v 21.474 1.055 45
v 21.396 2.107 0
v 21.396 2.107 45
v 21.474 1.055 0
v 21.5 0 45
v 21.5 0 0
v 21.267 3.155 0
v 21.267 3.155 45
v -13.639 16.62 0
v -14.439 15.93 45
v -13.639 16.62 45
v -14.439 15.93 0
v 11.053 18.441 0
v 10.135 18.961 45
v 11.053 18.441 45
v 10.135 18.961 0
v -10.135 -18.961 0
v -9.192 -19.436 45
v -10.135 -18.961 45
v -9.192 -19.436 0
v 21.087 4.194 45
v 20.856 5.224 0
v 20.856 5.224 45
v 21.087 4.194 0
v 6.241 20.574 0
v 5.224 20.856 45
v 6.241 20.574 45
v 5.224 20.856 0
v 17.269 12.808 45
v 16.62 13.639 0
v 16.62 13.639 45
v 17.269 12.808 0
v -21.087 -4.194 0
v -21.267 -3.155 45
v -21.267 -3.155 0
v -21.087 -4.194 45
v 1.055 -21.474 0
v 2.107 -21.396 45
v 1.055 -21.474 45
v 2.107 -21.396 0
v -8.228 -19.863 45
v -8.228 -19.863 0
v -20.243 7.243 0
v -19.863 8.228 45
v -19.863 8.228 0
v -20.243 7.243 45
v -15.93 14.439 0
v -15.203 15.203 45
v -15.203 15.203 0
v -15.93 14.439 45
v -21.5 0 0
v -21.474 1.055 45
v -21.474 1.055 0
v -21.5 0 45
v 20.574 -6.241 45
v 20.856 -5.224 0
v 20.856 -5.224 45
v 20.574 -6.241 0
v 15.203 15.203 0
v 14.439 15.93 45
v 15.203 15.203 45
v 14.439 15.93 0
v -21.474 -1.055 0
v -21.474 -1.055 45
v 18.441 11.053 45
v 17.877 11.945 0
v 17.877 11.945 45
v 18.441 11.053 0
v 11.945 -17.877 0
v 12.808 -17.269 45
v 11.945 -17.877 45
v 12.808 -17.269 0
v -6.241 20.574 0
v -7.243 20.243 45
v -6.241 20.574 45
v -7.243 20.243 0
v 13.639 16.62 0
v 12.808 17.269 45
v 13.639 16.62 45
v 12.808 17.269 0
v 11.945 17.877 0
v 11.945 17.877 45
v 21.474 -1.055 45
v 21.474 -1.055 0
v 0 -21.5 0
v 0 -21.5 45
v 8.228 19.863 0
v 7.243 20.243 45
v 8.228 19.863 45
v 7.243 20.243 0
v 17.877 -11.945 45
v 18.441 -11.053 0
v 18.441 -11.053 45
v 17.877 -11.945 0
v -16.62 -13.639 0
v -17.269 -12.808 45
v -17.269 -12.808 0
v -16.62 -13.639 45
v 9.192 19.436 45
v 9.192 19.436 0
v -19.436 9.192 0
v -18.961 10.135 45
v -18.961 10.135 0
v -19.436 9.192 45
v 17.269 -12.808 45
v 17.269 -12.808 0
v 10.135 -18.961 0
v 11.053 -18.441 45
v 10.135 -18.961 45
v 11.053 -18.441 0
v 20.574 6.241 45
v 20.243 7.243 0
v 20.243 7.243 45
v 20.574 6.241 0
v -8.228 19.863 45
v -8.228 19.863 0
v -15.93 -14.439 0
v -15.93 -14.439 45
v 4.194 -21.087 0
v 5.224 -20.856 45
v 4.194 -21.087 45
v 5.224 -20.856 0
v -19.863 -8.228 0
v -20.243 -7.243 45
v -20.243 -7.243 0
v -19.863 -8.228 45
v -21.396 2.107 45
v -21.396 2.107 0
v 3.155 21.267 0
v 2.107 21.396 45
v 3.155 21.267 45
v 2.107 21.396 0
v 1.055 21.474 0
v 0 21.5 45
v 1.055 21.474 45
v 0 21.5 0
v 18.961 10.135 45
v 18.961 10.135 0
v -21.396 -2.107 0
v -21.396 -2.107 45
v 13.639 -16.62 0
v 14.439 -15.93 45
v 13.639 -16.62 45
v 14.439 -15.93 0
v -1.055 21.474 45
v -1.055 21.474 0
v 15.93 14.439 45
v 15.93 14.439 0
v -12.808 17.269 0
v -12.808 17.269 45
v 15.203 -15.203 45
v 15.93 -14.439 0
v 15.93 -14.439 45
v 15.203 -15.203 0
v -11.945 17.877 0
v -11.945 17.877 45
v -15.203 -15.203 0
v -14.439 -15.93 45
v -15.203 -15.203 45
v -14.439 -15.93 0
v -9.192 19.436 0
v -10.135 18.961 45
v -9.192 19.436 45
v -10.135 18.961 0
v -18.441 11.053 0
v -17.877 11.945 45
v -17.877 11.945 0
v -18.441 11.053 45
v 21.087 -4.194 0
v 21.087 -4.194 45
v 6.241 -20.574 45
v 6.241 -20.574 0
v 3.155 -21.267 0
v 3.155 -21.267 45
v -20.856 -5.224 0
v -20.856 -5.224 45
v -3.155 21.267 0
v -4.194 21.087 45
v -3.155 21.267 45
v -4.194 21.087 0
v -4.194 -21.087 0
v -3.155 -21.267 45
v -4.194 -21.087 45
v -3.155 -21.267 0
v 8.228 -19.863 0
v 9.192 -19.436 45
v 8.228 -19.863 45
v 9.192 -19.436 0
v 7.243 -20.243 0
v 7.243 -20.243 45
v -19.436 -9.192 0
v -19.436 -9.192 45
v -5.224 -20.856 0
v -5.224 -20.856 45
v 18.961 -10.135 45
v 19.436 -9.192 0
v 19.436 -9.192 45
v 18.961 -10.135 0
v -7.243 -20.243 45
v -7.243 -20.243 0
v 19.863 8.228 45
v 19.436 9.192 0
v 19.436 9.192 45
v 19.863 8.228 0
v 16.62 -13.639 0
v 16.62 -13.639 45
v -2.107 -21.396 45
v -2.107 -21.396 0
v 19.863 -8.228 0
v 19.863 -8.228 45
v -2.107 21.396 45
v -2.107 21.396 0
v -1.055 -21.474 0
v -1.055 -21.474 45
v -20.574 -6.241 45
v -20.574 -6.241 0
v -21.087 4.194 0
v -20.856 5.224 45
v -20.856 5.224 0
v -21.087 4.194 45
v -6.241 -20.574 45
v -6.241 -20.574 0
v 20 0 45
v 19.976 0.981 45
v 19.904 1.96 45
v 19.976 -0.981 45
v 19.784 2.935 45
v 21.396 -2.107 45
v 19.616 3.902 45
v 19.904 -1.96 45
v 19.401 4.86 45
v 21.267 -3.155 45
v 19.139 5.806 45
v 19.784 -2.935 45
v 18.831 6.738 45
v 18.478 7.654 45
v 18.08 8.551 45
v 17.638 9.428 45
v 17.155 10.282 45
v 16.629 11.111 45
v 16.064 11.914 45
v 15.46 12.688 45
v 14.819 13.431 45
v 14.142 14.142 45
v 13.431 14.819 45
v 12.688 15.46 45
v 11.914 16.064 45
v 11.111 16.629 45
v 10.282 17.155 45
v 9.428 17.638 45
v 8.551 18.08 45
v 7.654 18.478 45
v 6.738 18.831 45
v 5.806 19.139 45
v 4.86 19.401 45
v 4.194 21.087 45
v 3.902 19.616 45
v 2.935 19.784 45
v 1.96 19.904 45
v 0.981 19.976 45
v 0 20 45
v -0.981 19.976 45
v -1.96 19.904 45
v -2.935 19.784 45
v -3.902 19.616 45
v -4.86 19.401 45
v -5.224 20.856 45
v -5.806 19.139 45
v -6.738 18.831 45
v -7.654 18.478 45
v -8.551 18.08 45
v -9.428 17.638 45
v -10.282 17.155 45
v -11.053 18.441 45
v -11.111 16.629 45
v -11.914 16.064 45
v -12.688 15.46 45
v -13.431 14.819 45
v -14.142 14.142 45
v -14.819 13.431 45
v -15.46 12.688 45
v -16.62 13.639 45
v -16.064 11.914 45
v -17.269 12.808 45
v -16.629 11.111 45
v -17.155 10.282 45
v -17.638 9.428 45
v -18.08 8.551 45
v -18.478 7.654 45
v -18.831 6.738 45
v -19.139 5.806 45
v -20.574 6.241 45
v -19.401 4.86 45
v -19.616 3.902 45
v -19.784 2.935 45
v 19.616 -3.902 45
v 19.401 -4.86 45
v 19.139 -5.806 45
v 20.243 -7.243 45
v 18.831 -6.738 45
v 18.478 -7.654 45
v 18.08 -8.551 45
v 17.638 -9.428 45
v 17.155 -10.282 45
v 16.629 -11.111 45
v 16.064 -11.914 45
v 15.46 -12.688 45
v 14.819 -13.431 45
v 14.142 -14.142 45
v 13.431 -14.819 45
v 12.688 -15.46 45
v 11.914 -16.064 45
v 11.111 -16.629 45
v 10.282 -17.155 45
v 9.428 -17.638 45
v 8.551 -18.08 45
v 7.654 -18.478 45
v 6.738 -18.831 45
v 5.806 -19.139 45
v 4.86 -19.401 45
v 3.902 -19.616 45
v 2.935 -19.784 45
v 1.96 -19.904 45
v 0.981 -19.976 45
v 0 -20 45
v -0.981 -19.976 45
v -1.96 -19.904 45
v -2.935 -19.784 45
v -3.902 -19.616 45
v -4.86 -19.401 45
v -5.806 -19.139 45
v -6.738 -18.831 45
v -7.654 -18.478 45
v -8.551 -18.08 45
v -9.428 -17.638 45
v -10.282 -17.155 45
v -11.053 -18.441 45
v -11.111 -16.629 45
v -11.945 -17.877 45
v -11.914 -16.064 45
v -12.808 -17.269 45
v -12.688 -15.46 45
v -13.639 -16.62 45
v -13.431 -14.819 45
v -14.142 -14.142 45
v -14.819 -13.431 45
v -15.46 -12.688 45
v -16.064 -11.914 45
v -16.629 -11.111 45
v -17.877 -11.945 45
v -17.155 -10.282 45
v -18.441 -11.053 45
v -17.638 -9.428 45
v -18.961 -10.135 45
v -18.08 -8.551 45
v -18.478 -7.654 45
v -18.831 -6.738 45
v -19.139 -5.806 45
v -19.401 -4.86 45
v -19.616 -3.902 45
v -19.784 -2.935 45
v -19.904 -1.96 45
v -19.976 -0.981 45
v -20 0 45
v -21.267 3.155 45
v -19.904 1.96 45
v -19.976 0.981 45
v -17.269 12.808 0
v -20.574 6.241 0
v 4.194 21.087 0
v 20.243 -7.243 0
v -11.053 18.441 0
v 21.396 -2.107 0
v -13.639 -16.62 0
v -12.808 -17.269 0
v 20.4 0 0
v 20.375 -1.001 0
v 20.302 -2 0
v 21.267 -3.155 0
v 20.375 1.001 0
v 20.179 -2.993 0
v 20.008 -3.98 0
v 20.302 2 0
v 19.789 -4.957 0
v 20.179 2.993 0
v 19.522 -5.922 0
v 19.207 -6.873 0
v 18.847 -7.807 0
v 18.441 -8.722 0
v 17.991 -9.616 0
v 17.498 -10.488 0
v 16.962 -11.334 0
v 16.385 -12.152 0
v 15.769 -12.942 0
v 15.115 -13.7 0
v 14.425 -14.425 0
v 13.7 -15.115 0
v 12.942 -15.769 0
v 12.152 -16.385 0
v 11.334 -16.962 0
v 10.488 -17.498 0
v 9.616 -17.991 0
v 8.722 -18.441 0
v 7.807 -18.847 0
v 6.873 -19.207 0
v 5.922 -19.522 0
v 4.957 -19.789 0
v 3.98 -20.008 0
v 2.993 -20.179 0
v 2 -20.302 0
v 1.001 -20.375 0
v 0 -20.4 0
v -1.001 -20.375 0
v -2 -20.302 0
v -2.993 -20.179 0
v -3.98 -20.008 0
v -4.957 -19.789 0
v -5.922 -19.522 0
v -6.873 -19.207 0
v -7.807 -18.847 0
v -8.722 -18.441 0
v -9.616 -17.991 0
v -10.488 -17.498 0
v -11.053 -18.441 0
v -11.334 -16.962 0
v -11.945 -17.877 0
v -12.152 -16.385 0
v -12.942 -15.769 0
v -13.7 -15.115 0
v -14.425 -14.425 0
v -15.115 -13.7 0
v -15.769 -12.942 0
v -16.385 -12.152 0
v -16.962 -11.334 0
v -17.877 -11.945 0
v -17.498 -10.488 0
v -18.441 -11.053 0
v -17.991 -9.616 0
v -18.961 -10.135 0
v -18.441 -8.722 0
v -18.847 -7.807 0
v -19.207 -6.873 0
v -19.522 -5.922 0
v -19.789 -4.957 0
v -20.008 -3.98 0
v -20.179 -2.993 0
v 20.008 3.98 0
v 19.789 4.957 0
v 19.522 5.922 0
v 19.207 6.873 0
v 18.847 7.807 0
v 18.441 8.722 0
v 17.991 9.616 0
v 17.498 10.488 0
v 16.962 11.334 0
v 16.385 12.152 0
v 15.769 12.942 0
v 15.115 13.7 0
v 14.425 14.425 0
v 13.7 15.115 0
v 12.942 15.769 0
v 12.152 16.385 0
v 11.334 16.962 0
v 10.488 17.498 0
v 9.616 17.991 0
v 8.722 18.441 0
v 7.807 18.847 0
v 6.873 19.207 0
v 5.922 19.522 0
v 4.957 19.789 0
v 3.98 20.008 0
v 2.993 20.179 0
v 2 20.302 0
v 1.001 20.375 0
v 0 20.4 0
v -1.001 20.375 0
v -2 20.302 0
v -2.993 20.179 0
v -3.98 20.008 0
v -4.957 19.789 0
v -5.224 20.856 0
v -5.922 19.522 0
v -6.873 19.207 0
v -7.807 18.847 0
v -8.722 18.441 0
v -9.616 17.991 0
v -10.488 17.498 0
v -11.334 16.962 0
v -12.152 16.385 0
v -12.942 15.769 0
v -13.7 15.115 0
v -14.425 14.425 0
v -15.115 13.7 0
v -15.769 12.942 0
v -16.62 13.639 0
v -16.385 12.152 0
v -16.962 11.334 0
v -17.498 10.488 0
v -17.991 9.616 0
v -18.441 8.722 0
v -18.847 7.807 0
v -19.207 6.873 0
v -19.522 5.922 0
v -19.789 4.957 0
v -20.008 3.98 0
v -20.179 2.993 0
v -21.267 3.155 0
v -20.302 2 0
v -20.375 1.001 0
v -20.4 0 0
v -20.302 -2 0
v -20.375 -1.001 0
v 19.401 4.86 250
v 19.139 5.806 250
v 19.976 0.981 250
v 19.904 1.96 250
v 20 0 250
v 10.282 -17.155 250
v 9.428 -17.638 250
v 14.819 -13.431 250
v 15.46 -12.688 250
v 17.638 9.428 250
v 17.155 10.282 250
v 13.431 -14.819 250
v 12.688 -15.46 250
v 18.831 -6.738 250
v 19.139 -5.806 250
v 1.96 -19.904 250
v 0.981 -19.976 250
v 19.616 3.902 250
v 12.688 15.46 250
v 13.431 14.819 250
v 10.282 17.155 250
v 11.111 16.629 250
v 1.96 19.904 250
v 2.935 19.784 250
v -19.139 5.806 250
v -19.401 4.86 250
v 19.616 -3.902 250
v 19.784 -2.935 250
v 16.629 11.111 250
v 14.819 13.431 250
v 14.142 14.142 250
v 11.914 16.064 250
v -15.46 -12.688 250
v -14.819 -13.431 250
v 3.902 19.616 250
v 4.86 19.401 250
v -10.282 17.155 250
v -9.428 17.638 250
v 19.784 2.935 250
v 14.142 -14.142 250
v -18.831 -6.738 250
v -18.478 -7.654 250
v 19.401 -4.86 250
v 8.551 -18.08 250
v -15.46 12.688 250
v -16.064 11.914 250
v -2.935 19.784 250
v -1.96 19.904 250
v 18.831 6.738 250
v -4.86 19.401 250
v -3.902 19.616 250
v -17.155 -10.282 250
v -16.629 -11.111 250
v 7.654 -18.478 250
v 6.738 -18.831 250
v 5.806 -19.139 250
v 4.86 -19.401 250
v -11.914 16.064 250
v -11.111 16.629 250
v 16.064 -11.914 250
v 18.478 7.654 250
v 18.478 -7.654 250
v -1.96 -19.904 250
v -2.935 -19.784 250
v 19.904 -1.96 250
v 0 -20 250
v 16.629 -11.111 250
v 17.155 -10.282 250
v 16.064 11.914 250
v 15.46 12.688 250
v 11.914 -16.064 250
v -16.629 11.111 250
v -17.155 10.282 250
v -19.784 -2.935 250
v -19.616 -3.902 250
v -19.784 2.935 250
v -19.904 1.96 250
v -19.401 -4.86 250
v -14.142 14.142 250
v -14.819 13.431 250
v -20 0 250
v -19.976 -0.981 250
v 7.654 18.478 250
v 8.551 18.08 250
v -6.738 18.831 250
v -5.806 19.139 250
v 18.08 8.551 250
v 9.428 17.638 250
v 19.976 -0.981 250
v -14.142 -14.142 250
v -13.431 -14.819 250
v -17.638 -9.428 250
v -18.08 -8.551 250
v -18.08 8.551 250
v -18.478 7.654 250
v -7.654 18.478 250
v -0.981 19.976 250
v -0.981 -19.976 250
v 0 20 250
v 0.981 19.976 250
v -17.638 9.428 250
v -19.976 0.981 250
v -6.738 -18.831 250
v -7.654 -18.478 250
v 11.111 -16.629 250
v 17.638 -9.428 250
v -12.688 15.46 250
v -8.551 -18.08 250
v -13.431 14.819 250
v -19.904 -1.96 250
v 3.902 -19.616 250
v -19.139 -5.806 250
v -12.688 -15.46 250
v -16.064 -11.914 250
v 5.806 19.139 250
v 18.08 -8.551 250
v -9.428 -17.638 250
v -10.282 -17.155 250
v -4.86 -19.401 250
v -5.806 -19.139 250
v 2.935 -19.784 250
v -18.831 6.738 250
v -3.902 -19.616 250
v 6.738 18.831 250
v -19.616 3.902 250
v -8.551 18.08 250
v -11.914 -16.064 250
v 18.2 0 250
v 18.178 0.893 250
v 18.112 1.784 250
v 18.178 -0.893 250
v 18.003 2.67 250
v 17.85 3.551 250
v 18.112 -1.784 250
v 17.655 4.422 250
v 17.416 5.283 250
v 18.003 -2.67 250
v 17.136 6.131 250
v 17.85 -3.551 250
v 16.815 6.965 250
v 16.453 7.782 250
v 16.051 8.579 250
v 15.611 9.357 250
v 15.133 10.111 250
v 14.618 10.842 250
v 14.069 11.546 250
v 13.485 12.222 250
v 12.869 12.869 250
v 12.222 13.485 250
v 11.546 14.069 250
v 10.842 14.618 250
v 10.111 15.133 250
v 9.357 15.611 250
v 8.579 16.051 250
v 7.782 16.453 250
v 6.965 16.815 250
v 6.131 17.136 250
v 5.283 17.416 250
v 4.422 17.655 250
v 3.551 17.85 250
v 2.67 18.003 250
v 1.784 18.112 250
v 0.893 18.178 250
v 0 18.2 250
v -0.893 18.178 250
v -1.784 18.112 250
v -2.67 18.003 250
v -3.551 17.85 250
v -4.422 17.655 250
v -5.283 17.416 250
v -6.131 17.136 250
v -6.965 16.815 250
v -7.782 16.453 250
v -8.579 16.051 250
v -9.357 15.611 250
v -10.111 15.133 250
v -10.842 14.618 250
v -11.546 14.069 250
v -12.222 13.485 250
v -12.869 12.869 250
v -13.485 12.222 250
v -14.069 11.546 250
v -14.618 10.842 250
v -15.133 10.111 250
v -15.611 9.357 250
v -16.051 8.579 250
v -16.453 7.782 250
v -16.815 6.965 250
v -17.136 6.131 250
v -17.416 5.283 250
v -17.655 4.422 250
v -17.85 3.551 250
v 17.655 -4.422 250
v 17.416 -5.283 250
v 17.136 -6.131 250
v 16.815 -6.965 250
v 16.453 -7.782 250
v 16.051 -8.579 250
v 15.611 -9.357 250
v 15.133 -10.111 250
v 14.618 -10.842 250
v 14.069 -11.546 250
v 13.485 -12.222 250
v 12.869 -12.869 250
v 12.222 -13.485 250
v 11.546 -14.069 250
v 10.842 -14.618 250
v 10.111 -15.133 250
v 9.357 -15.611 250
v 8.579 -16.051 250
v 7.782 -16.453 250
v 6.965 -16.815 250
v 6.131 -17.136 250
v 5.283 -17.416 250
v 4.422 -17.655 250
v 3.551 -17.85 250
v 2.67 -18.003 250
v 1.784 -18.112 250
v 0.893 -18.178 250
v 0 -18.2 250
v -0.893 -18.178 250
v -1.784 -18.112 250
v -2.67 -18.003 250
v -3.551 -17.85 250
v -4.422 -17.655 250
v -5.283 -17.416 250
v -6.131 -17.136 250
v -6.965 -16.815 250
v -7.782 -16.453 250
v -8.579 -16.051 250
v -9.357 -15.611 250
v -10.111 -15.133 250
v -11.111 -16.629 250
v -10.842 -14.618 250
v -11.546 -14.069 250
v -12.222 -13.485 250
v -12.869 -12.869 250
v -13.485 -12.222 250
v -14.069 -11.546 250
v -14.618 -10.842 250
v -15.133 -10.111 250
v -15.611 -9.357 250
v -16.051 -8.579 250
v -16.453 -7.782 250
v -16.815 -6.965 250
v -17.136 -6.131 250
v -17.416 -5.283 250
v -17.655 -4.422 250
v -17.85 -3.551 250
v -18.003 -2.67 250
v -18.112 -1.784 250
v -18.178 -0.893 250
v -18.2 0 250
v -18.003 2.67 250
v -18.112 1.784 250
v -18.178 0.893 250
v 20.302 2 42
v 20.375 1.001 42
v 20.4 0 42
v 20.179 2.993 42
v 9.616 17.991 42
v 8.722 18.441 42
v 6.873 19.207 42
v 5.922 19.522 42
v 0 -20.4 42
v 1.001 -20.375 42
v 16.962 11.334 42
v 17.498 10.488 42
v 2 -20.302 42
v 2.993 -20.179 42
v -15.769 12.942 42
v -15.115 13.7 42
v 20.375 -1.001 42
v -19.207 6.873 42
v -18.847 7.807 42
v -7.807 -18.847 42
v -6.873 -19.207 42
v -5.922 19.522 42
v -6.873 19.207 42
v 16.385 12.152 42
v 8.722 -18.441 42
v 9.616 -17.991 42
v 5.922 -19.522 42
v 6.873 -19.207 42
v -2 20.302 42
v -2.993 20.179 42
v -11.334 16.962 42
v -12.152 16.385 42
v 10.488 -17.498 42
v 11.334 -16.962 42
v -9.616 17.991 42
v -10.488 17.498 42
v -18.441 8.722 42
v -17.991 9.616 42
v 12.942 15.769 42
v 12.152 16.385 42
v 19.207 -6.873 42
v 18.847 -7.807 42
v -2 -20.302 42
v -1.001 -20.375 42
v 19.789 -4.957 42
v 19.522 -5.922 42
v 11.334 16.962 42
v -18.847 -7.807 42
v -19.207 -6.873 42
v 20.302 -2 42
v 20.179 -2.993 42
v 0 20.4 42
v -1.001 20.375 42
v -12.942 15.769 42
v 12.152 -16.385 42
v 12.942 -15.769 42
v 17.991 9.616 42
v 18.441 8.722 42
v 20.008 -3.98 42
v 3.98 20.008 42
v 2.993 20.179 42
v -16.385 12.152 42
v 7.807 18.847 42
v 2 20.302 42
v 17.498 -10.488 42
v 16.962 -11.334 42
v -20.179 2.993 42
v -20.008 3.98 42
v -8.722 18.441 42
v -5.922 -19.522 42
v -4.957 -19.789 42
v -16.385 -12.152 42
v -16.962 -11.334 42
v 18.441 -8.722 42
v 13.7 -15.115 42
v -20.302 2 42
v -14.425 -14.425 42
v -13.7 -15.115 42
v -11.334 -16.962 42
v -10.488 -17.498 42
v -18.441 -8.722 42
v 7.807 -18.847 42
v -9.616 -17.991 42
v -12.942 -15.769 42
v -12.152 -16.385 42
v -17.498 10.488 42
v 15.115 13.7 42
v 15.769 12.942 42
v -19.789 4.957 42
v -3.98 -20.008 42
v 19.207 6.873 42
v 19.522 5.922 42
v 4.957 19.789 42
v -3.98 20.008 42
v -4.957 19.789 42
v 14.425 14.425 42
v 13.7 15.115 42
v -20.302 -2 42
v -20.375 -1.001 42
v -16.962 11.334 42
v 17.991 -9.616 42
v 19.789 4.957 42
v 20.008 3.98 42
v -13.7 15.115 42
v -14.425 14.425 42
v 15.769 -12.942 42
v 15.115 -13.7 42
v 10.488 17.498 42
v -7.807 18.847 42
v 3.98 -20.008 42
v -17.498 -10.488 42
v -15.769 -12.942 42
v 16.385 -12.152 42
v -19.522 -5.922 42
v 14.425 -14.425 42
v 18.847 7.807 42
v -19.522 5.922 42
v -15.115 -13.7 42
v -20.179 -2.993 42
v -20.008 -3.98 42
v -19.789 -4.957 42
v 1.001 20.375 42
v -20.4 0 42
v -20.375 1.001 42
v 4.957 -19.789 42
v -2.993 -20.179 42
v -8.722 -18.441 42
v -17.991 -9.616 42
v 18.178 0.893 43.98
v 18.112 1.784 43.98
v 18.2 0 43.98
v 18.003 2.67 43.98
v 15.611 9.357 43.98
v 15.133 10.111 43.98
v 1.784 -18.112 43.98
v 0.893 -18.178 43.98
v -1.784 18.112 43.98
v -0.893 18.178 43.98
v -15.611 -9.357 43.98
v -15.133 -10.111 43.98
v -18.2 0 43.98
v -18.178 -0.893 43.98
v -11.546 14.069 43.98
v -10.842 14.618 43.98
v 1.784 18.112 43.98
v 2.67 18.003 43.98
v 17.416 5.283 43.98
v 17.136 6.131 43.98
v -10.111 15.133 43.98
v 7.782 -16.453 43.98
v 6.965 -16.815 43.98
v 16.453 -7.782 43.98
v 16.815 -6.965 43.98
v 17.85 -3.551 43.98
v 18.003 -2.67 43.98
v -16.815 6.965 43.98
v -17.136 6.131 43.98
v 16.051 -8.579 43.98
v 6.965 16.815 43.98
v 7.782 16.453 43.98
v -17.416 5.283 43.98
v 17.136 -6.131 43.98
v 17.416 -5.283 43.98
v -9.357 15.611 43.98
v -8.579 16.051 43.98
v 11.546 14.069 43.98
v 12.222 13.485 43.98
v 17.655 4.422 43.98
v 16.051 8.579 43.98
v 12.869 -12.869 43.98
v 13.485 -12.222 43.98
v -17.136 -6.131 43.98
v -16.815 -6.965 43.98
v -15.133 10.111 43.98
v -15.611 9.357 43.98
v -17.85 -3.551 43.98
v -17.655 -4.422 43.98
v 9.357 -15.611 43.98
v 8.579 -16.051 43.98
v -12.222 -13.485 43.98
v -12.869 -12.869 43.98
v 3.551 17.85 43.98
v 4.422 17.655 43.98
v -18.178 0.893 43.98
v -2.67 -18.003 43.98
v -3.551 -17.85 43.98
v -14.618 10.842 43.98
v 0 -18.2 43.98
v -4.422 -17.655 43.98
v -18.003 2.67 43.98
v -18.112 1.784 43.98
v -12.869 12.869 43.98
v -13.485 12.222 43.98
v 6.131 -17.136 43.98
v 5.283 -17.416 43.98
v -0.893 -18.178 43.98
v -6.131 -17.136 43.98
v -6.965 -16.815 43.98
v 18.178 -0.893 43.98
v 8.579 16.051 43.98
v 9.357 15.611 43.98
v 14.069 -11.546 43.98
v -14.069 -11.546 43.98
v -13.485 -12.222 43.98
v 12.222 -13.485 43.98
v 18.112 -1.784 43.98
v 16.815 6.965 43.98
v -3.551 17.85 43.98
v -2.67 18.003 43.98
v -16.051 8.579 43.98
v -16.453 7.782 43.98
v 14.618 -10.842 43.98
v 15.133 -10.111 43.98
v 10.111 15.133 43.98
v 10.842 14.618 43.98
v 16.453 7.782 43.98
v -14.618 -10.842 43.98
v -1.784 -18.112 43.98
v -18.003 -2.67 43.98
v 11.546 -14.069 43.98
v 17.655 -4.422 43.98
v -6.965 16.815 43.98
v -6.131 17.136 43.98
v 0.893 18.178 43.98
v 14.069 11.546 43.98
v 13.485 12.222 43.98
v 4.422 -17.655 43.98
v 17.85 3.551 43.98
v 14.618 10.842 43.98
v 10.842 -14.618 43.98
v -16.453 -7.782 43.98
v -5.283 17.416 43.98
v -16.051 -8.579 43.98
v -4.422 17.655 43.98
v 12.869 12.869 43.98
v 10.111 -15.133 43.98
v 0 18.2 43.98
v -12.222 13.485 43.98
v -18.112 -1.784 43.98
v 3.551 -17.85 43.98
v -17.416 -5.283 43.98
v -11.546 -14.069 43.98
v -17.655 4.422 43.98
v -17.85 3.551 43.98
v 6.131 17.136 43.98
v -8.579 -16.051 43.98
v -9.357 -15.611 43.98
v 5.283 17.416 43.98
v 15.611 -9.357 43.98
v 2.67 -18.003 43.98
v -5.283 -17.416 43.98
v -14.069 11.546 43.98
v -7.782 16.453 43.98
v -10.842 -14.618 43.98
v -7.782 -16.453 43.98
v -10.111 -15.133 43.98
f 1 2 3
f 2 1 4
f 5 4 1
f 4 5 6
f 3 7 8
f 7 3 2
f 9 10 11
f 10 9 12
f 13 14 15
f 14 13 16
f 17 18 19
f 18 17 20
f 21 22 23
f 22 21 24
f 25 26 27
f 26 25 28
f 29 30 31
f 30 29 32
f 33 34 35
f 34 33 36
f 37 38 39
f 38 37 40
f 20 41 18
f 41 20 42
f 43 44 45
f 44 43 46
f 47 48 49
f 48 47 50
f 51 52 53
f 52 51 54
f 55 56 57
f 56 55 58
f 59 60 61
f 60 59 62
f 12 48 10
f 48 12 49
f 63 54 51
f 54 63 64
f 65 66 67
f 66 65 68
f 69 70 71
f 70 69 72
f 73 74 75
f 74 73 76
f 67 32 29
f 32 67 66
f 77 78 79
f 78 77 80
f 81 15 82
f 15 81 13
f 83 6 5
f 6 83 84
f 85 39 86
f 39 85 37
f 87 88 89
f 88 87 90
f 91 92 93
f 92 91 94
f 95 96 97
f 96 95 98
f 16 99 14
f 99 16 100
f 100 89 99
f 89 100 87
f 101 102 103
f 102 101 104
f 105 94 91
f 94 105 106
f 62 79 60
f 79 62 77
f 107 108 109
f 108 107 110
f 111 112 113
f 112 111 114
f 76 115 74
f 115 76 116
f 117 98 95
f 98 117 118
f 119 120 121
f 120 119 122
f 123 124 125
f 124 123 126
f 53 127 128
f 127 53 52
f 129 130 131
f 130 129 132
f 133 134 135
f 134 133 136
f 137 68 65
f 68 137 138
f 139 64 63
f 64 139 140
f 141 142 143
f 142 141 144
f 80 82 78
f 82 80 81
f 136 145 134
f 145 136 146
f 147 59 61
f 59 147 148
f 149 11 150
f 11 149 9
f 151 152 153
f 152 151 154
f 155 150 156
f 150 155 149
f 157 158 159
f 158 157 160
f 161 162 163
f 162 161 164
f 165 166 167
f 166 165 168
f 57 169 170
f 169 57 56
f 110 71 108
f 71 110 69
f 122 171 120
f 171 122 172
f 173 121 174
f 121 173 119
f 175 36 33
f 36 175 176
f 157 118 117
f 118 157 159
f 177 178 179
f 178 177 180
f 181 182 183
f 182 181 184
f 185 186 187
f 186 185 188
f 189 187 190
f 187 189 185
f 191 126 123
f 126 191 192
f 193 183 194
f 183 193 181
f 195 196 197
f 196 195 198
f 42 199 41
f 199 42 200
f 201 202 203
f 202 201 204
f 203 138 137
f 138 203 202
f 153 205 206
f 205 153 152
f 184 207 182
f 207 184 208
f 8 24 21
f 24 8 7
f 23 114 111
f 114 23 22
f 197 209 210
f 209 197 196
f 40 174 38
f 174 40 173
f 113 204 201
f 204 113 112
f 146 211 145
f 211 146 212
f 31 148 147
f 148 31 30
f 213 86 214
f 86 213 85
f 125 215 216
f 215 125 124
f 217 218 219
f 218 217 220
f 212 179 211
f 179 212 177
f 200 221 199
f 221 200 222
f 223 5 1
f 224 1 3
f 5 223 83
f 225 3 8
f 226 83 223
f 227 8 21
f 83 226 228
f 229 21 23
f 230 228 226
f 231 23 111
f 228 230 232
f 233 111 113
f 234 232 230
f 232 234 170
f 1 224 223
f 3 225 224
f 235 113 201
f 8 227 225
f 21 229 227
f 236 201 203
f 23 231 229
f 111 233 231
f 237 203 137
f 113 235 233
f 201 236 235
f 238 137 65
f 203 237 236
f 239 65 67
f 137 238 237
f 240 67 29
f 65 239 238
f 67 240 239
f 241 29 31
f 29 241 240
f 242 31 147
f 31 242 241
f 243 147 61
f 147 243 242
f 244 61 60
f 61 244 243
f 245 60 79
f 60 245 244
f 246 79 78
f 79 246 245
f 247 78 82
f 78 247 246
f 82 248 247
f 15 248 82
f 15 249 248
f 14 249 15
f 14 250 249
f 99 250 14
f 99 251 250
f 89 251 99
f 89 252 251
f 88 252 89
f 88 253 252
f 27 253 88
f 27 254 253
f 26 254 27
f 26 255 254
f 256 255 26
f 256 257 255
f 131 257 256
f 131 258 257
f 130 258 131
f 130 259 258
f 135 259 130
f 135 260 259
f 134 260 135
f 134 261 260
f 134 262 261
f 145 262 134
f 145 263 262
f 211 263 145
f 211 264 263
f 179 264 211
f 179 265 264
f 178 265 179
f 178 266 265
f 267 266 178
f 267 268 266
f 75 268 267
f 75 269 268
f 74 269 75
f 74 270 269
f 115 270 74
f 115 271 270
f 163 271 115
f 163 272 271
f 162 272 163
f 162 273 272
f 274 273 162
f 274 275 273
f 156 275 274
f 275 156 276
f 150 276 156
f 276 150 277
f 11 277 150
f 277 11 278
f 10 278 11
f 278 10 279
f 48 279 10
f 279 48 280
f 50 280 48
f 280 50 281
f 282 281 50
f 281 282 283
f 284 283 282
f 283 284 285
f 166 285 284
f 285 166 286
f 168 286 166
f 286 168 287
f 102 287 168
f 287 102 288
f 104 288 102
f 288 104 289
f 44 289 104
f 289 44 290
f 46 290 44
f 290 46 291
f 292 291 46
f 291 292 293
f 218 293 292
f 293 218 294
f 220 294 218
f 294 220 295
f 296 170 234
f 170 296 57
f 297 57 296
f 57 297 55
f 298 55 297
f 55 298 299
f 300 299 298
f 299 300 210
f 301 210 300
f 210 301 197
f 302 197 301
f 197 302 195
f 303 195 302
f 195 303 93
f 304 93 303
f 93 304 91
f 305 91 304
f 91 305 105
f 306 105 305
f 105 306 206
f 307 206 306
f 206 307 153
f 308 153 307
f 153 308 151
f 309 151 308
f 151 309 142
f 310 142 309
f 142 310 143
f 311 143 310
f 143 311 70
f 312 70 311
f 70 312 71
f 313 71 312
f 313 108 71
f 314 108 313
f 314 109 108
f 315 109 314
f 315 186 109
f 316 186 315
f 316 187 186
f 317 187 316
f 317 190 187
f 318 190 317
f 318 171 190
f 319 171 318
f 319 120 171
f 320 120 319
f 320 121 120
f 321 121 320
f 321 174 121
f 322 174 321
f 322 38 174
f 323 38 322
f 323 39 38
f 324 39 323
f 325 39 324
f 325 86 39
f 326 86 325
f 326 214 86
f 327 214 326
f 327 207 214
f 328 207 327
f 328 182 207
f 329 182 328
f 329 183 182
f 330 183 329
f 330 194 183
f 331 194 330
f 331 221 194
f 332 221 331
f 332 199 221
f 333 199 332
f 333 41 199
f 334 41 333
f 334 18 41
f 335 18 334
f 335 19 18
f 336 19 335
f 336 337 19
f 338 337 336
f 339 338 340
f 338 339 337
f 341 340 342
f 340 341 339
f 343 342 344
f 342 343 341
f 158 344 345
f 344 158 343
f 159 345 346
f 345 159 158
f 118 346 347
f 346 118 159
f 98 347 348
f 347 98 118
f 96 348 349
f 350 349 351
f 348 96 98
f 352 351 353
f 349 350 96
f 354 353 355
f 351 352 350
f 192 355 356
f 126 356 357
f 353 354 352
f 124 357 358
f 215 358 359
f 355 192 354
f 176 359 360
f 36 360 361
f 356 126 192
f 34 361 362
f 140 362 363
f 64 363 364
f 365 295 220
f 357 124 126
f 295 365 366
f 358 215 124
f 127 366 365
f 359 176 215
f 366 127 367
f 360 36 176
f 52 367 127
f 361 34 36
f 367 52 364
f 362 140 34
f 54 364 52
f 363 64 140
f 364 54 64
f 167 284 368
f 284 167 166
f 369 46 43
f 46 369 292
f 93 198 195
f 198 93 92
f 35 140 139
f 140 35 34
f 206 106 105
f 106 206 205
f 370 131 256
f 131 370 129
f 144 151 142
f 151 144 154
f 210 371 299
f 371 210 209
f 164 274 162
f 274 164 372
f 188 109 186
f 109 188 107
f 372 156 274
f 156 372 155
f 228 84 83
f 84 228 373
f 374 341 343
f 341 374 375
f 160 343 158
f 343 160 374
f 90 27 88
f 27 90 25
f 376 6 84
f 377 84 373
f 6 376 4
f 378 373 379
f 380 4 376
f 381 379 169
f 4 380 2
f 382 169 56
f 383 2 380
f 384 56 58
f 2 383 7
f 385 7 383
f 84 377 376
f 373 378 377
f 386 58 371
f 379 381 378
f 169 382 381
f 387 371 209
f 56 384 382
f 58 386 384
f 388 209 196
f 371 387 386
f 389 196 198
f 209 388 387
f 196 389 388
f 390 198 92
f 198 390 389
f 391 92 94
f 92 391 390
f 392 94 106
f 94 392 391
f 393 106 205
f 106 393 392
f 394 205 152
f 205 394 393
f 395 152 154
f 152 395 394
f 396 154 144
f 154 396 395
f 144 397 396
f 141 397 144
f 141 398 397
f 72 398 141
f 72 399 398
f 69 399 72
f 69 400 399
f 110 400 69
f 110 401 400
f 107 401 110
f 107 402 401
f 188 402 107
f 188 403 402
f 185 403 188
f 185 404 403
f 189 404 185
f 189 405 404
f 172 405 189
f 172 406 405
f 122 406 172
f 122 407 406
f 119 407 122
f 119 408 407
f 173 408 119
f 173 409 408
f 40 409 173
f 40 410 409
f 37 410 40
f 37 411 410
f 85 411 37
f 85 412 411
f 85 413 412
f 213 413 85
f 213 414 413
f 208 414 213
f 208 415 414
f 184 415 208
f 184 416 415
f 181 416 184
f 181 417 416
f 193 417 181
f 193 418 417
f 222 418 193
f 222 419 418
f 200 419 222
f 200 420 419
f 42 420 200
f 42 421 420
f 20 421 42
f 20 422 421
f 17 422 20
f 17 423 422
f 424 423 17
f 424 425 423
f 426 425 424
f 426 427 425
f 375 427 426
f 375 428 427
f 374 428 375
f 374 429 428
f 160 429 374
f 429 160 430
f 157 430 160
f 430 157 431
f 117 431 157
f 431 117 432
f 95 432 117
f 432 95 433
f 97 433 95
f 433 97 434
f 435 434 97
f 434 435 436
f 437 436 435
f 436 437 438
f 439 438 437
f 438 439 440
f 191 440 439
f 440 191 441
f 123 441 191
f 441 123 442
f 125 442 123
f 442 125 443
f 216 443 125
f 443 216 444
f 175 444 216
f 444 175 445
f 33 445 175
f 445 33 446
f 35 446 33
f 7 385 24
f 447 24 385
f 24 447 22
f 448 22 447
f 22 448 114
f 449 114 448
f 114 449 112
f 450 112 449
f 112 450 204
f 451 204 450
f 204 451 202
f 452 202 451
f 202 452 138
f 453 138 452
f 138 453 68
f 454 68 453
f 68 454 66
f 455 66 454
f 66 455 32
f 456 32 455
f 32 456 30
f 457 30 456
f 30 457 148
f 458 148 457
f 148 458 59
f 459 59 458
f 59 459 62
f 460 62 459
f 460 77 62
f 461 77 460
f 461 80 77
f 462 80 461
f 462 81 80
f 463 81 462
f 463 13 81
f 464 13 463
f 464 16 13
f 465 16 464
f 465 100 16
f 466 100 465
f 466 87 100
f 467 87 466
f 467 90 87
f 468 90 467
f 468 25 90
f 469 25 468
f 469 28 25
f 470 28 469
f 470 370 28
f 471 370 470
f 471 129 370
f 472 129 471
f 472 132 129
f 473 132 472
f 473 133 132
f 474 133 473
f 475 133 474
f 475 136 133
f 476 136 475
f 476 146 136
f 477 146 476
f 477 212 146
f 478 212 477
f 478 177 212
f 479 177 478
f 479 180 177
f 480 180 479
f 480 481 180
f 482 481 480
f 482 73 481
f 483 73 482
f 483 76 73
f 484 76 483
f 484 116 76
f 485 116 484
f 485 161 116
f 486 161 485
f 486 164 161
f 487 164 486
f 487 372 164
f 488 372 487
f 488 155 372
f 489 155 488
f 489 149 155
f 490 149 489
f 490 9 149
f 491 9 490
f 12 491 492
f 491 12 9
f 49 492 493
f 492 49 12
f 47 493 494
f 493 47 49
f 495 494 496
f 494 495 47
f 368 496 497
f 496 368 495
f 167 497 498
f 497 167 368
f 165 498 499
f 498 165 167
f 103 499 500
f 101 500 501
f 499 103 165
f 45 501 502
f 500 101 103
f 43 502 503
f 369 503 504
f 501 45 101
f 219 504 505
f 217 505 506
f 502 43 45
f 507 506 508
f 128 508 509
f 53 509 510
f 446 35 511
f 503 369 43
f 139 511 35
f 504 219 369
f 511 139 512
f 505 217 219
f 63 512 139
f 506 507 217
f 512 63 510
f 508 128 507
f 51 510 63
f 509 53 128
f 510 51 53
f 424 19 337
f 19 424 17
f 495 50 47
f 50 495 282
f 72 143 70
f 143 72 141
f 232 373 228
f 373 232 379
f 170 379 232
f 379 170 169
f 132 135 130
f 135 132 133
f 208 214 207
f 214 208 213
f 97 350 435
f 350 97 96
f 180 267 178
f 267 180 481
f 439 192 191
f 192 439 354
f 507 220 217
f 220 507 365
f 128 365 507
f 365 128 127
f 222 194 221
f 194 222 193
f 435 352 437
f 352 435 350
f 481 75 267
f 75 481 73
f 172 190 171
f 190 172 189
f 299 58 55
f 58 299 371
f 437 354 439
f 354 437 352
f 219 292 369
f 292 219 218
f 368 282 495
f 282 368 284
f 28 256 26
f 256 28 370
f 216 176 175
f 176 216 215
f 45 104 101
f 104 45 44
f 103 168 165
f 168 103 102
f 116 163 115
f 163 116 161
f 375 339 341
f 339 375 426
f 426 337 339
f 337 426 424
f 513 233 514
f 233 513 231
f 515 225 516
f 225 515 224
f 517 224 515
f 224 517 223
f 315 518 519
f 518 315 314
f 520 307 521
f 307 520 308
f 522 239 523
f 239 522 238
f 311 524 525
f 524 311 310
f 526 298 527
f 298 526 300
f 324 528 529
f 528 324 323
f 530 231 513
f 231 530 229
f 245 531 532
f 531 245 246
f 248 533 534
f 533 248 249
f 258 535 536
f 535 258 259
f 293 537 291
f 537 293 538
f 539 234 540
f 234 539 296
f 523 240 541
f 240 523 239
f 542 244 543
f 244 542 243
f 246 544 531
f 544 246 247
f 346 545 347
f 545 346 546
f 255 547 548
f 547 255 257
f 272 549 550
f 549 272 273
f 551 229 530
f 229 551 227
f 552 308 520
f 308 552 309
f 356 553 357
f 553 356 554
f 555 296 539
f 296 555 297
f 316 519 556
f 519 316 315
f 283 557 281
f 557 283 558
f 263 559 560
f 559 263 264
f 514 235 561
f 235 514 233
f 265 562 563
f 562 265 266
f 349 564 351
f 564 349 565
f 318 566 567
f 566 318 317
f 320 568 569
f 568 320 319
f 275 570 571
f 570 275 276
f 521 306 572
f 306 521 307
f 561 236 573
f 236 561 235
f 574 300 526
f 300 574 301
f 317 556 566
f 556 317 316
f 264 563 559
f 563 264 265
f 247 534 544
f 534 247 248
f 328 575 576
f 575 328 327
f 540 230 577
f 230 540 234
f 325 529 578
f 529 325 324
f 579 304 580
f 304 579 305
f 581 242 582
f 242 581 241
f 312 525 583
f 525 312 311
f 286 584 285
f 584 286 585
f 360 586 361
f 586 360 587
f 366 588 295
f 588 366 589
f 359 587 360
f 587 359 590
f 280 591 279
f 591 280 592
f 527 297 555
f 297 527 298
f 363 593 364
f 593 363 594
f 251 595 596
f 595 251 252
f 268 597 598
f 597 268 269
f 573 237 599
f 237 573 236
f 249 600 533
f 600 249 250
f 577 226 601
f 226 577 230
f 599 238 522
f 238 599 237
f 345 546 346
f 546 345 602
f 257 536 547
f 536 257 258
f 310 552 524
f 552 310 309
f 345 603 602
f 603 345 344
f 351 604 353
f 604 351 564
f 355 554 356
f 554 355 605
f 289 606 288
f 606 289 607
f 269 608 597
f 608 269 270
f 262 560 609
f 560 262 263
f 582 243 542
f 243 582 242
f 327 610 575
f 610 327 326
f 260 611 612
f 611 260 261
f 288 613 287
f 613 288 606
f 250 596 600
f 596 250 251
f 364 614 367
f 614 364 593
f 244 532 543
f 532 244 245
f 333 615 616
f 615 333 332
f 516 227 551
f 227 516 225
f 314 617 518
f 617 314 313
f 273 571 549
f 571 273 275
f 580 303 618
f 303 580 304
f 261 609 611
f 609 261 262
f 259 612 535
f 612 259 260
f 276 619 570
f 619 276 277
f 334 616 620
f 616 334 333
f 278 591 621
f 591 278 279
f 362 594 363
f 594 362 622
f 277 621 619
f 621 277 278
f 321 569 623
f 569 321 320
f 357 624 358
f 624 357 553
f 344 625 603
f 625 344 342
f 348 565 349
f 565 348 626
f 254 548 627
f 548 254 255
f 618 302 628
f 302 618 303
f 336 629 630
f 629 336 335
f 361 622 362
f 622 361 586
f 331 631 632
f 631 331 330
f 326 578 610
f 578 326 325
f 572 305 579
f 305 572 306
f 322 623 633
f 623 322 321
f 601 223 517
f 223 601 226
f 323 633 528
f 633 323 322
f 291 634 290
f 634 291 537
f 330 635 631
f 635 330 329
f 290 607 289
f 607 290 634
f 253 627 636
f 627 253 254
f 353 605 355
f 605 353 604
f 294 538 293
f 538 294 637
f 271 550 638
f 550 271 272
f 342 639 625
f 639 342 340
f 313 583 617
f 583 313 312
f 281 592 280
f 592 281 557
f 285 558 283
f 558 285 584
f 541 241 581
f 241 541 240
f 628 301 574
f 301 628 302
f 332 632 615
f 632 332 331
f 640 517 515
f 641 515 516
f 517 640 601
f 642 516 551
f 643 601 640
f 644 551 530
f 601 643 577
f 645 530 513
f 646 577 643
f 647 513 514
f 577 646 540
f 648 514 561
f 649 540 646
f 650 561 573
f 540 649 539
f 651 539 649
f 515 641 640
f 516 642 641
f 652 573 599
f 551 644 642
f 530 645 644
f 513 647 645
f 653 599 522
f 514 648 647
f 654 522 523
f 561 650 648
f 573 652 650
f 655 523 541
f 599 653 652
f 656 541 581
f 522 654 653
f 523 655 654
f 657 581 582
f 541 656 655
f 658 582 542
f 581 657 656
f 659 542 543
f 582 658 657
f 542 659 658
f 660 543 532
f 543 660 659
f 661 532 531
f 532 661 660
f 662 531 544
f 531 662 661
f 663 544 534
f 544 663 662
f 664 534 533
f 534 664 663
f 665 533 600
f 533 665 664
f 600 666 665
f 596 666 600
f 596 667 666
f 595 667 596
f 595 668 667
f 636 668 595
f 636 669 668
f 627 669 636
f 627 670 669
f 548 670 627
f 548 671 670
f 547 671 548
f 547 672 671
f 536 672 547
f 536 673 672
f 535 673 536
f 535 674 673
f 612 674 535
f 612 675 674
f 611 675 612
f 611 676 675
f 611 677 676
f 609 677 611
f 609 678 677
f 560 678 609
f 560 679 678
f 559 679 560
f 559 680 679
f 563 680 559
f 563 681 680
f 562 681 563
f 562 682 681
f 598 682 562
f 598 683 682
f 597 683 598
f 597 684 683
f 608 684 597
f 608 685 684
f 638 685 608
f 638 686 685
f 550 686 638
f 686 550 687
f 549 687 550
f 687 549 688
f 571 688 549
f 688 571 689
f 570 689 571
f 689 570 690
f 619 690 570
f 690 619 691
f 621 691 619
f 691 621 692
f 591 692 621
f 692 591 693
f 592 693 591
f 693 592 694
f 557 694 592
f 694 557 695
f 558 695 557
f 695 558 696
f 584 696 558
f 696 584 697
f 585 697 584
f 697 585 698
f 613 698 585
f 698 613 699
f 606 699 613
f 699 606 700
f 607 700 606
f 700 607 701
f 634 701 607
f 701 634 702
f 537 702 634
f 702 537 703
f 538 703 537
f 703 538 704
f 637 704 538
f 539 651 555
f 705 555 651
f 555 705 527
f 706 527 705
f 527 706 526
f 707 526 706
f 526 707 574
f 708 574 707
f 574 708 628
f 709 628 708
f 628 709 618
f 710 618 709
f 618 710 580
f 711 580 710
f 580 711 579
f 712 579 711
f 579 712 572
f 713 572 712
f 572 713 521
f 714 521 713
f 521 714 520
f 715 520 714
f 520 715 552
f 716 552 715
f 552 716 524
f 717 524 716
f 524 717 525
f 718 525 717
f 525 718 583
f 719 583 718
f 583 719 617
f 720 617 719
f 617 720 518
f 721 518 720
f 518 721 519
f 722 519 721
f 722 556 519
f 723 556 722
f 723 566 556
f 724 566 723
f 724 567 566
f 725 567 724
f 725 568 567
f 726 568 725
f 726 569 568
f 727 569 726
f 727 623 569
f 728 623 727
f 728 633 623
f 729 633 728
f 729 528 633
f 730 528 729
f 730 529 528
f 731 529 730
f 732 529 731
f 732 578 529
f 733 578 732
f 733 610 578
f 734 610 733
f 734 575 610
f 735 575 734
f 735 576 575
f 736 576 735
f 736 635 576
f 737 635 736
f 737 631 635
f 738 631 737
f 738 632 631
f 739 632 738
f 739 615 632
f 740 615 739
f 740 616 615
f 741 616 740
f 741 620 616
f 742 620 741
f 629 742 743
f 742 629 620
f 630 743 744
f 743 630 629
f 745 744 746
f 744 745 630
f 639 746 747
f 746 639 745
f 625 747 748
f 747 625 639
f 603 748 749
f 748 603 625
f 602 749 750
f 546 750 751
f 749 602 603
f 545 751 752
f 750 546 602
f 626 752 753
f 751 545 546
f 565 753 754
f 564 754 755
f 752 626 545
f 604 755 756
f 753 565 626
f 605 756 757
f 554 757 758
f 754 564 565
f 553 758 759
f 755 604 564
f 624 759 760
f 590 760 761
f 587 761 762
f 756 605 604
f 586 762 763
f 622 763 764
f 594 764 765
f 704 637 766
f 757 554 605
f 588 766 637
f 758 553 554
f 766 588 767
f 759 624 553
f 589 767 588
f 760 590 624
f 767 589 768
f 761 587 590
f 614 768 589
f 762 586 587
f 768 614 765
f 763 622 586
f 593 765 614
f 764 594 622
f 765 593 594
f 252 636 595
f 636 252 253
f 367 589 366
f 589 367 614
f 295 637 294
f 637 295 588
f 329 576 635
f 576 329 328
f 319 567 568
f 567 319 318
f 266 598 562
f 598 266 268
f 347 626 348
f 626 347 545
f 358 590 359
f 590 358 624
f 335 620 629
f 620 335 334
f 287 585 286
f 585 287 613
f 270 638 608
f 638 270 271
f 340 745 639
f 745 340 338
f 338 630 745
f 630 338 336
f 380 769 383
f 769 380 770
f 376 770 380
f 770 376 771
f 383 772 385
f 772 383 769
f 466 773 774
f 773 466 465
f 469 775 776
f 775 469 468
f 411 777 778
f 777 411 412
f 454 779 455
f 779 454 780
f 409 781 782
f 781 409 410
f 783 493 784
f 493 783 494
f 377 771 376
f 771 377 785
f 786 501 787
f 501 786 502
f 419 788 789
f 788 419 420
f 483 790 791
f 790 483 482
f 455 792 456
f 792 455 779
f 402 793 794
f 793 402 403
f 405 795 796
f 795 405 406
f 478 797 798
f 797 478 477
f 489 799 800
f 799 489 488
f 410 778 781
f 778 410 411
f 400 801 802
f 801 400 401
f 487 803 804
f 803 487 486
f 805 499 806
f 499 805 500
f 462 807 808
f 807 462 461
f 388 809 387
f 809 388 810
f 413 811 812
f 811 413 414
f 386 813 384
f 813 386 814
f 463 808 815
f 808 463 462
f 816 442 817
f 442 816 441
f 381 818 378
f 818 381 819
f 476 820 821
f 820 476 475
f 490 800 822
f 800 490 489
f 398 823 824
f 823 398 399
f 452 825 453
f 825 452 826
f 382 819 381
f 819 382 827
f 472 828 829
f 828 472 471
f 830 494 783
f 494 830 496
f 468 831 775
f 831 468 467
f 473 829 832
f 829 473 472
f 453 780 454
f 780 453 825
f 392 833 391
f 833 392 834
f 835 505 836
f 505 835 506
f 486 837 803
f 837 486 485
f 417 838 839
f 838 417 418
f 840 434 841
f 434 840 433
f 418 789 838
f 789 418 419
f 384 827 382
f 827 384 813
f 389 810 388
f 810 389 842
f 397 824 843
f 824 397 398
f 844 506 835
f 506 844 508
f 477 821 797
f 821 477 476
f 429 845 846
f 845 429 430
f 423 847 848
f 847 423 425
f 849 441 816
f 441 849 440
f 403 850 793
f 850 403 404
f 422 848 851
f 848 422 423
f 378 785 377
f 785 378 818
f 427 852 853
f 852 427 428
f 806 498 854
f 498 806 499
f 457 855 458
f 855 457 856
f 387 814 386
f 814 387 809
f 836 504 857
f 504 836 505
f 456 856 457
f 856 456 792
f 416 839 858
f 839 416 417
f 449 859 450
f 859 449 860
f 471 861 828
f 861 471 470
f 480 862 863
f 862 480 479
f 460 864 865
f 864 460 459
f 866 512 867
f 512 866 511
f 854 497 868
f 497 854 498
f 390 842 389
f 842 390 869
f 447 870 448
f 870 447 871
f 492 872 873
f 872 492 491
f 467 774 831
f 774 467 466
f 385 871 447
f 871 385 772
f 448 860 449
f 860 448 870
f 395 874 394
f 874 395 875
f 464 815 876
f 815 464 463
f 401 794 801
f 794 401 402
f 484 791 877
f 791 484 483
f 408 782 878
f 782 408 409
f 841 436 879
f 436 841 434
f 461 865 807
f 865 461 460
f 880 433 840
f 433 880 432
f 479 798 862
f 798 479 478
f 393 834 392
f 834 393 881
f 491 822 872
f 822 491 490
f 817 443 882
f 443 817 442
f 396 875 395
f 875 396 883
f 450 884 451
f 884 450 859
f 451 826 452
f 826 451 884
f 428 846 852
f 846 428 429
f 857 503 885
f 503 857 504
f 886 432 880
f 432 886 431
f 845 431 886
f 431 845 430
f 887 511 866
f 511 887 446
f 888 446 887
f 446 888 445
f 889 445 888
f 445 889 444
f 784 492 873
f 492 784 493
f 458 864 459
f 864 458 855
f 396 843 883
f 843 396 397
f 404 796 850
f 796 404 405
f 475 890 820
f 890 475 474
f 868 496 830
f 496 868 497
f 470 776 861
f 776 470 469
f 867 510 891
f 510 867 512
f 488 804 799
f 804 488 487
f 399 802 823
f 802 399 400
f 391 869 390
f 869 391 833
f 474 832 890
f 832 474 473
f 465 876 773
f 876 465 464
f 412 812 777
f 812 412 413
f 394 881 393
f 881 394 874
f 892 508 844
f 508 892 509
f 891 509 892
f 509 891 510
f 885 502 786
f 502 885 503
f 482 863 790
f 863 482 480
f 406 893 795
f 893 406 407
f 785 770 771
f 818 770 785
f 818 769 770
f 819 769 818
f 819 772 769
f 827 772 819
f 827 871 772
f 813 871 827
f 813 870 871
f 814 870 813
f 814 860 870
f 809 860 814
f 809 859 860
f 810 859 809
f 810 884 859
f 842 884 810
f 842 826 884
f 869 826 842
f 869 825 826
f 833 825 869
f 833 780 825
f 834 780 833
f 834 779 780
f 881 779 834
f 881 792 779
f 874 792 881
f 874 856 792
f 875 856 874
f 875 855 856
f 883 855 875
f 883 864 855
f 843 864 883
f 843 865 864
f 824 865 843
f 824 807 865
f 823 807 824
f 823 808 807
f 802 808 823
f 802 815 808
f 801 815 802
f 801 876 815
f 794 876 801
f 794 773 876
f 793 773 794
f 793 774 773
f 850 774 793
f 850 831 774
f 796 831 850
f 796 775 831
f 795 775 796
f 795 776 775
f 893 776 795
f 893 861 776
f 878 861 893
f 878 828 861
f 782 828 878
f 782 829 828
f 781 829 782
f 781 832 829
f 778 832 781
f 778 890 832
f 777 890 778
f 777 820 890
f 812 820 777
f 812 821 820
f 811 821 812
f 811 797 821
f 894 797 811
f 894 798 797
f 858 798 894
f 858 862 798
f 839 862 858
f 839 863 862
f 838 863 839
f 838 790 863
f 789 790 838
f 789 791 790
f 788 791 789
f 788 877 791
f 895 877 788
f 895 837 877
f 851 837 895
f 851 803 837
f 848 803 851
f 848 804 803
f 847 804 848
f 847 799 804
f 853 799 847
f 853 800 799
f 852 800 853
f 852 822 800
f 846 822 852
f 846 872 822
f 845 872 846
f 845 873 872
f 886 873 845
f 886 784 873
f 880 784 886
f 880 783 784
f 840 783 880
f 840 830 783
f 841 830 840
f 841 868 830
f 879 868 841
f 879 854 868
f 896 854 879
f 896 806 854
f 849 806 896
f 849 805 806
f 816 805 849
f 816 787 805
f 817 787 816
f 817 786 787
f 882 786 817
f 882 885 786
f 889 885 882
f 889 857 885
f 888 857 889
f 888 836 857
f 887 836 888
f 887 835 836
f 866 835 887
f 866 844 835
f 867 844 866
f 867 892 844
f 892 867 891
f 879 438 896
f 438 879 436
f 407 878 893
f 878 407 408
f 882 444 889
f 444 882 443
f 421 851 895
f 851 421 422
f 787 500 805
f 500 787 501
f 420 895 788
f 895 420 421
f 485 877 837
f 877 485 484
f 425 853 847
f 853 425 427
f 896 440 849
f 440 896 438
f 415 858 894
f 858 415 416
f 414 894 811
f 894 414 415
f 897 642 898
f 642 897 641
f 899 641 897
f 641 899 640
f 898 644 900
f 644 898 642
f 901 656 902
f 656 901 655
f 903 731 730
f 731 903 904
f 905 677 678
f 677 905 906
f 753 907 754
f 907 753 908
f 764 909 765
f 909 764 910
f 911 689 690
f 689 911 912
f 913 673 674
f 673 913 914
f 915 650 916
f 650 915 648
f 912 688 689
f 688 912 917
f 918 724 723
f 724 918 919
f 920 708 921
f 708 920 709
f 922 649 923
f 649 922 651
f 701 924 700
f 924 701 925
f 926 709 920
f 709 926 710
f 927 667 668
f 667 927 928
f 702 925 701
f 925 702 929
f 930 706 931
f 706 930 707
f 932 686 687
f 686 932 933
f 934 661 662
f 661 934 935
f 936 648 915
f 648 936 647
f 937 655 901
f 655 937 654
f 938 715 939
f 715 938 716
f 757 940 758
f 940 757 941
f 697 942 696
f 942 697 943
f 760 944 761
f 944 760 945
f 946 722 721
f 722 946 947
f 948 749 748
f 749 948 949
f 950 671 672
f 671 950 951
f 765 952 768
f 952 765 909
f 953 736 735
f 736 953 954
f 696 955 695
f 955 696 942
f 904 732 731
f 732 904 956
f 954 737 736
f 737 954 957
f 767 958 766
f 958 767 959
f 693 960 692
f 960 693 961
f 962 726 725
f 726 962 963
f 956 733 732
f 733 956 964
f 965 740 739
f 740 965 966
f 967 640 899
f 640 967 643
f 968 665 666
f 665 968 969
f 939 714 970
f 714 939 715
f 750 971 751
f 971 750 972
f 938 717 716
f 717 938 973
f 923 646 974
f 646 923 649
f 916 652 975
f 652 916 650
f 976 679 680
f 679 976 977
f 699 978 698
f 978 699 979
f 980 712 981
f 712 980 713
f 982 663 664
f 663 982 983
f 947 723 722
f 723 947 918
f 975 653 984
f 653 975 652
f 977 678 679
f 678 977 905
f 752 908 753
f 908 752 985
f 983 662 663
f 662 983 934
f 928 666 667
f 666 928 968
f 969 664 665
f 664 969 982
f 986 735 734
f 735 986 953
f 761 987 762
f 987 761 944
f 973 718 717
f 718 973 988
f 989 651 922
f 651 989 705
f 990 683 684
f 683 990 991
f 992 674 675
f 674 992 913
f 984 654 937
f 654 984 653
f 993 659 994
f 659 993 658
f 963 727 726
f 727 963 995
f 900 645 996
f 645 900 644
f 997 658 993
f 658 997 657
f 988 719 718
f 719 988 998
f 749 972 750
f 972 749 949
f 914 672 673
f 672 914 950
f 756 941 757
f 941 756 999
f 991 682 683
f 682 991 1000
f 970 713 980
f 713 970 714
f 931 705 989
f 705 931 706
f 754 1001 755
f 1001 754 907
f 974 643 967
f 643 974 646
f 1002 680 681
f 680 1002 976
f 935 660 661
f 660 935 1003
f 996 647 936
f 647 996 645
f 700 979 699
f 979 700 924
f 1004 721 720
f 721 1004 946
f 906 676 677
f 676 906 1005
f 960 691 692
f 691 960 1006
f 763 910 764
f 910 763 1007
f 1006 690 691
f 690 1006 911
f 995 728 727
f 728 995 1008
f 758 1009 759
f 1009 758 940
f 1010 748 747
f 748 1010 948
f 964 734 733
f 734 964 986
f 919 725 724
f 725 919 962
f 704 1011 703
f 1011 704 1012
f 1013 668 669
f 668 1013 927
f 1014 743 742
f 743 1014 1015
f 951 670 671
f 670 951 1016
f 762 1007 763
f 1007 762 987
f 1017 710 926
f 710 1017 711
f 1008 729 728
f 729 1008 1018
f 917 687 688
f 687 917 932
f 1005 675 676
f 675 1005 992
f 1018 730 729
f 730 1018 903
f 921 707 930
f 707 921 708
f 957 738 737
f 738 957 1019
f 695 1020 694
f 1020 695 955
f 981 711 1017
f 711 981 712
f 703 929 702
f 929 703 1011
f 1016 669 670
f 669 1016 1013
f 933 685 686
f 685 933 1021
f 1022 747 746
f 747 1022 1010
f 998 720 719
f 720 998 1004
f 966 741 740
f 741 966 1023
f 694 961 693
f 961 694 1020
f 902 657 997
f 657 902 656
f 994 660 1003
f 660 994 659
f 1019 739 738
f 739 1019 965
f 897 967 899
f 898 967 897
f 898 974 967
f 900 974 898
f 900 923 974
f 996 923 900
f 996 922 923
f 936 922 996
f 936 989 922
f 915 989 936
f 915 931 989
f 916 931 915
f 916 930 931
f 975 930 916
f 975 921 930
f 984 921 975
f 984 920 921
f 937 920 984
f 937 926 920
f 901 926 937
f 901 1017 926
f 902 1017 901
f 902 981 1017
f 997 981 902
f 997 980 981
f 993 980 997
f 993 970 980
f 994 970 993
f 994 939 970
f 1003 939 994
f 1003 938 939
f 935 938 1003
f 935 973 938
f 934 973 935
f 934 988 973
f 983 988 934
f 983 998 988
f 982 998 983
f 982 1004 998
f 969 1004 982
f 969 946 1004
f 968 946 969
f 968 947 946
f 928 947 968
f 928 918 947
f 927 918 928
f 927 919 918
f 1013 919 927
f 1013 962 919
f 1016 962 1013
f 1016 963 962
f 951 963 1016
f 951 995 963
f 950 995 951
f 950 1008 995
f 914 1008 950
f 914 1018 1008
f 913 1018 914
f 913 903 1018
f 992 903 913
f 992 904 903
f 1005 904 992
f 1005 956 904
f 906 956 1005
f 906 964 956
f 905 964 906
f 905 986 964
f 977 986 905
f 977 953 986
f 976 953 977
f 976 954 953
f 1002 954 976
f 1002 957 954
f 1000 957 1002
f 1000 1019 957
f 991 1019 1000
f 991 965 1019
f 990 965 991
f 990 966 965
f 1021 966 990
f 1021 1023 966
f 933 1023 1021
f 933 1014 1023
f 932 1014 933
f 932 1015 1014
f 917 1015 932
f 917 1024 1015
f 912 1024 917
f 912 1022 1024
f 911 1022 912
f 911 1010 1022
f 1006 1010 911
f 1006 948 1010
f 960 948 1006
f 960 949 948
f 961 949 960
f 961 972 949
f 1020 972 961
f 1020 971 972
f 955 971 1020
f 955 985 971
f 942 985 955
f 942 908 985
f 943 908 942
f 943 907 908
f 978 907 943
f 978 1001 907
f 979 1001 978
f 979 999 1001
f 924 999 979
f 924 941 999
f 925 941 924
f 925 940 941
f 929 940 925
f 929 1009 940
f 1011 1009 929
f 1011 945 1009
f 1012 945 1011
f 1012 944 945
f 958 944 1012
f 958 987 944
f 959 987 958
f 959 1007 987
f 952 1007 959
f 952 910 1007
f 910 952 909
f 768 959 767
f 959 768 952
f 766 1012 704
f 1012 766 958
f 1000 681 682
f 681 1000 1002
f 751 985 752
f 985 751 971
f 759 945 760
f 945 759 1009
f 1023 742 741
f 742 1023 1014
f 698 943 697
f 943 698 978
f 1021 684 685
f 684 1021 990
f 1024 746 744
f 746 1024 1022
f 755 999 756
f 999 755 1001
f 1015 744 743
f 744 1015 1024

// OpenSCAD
// HT 40 pipe 250 mm (single connected solid)

// Parameters
pipe_standard = 1; //[1:1:1]
nominal_diameter = 40; //[20:80:1]
length_mm = 250; //[125:500:1]
od_mm = 40; //[20:80:0.5]
wall_thickness_mm = 1.8; //[0.9:3.6:0.1]
fitting_length_mm = 45; //[25:90:1]
fitting_wall_extra_mm = 1.5; //[0.5:4:0.1]
socket_clearance_mm = 0.4; //[0.1:1.2:0.05]
socket_stop_thickness_mm = 3; //[1.5:6:0.5]
overlap_mm = 1; //[0.5:2:0.1]

$fn = 128;

module ht_pipe() {
  // Radii
  od_r = od_mm/2;
  id_r = max(0.01, od_r - wall_thickness_mm);

  socket_od_r = od_r + fitting_wall_extra_mm;
  socket_id_r = od_r + socket_clearance_mm;

  // Ensure valid stop thickness
  stop_t = min(socket_stop_thickness_mm, max(0.01, fitting_length_mm - 0.01));

  // Z layout (pipe total length includes socket)
  z0 = 0;
  z_socket0 = z0;
  z_socket1 = z_socket0 + fitting_length_mm;

  // Main pipe overlaps into socket to guarantee connectivity
  z_pipe0 = z_socket1 - overlap_mm;
  z_pipe1 = z0 + length_mm;

  // Small epsilon to avoid coplanar subtraction artifacts
  eps = 0.02;

  color([0.85, 0.85, 0.8])
  difference() {
    // OUTER: connected union
    union() {
      translate([0,0,z_socket0])
        cylinder(h=fitting_length_mm, r=socket_od_r, center=false);

      translate([0,0,z_pipe0])
        cylinder(h=(z_pipe1 - z_pipe0), r=od_r, center=false);
    }

    // INNER: connected union (slightly extended to ensure clean openings)
    union() {
      // Socket bore (open end), stops before far end by stop_t
      translate([0,0,z_socket0 - eps])
        cylinder(h=(fitting_length_mm - stop_t) + eps, r=socket_id_r, center=false);

      // Pipe bore (through pipe length, including overlap region)
      translate([0,0,z_pipe0 - eps])
        cylinder(h=(z_pipe1 - z_pipe0) + 2*eps, r=id_r, center=false);
    }
  }
}

ht_pipe();
